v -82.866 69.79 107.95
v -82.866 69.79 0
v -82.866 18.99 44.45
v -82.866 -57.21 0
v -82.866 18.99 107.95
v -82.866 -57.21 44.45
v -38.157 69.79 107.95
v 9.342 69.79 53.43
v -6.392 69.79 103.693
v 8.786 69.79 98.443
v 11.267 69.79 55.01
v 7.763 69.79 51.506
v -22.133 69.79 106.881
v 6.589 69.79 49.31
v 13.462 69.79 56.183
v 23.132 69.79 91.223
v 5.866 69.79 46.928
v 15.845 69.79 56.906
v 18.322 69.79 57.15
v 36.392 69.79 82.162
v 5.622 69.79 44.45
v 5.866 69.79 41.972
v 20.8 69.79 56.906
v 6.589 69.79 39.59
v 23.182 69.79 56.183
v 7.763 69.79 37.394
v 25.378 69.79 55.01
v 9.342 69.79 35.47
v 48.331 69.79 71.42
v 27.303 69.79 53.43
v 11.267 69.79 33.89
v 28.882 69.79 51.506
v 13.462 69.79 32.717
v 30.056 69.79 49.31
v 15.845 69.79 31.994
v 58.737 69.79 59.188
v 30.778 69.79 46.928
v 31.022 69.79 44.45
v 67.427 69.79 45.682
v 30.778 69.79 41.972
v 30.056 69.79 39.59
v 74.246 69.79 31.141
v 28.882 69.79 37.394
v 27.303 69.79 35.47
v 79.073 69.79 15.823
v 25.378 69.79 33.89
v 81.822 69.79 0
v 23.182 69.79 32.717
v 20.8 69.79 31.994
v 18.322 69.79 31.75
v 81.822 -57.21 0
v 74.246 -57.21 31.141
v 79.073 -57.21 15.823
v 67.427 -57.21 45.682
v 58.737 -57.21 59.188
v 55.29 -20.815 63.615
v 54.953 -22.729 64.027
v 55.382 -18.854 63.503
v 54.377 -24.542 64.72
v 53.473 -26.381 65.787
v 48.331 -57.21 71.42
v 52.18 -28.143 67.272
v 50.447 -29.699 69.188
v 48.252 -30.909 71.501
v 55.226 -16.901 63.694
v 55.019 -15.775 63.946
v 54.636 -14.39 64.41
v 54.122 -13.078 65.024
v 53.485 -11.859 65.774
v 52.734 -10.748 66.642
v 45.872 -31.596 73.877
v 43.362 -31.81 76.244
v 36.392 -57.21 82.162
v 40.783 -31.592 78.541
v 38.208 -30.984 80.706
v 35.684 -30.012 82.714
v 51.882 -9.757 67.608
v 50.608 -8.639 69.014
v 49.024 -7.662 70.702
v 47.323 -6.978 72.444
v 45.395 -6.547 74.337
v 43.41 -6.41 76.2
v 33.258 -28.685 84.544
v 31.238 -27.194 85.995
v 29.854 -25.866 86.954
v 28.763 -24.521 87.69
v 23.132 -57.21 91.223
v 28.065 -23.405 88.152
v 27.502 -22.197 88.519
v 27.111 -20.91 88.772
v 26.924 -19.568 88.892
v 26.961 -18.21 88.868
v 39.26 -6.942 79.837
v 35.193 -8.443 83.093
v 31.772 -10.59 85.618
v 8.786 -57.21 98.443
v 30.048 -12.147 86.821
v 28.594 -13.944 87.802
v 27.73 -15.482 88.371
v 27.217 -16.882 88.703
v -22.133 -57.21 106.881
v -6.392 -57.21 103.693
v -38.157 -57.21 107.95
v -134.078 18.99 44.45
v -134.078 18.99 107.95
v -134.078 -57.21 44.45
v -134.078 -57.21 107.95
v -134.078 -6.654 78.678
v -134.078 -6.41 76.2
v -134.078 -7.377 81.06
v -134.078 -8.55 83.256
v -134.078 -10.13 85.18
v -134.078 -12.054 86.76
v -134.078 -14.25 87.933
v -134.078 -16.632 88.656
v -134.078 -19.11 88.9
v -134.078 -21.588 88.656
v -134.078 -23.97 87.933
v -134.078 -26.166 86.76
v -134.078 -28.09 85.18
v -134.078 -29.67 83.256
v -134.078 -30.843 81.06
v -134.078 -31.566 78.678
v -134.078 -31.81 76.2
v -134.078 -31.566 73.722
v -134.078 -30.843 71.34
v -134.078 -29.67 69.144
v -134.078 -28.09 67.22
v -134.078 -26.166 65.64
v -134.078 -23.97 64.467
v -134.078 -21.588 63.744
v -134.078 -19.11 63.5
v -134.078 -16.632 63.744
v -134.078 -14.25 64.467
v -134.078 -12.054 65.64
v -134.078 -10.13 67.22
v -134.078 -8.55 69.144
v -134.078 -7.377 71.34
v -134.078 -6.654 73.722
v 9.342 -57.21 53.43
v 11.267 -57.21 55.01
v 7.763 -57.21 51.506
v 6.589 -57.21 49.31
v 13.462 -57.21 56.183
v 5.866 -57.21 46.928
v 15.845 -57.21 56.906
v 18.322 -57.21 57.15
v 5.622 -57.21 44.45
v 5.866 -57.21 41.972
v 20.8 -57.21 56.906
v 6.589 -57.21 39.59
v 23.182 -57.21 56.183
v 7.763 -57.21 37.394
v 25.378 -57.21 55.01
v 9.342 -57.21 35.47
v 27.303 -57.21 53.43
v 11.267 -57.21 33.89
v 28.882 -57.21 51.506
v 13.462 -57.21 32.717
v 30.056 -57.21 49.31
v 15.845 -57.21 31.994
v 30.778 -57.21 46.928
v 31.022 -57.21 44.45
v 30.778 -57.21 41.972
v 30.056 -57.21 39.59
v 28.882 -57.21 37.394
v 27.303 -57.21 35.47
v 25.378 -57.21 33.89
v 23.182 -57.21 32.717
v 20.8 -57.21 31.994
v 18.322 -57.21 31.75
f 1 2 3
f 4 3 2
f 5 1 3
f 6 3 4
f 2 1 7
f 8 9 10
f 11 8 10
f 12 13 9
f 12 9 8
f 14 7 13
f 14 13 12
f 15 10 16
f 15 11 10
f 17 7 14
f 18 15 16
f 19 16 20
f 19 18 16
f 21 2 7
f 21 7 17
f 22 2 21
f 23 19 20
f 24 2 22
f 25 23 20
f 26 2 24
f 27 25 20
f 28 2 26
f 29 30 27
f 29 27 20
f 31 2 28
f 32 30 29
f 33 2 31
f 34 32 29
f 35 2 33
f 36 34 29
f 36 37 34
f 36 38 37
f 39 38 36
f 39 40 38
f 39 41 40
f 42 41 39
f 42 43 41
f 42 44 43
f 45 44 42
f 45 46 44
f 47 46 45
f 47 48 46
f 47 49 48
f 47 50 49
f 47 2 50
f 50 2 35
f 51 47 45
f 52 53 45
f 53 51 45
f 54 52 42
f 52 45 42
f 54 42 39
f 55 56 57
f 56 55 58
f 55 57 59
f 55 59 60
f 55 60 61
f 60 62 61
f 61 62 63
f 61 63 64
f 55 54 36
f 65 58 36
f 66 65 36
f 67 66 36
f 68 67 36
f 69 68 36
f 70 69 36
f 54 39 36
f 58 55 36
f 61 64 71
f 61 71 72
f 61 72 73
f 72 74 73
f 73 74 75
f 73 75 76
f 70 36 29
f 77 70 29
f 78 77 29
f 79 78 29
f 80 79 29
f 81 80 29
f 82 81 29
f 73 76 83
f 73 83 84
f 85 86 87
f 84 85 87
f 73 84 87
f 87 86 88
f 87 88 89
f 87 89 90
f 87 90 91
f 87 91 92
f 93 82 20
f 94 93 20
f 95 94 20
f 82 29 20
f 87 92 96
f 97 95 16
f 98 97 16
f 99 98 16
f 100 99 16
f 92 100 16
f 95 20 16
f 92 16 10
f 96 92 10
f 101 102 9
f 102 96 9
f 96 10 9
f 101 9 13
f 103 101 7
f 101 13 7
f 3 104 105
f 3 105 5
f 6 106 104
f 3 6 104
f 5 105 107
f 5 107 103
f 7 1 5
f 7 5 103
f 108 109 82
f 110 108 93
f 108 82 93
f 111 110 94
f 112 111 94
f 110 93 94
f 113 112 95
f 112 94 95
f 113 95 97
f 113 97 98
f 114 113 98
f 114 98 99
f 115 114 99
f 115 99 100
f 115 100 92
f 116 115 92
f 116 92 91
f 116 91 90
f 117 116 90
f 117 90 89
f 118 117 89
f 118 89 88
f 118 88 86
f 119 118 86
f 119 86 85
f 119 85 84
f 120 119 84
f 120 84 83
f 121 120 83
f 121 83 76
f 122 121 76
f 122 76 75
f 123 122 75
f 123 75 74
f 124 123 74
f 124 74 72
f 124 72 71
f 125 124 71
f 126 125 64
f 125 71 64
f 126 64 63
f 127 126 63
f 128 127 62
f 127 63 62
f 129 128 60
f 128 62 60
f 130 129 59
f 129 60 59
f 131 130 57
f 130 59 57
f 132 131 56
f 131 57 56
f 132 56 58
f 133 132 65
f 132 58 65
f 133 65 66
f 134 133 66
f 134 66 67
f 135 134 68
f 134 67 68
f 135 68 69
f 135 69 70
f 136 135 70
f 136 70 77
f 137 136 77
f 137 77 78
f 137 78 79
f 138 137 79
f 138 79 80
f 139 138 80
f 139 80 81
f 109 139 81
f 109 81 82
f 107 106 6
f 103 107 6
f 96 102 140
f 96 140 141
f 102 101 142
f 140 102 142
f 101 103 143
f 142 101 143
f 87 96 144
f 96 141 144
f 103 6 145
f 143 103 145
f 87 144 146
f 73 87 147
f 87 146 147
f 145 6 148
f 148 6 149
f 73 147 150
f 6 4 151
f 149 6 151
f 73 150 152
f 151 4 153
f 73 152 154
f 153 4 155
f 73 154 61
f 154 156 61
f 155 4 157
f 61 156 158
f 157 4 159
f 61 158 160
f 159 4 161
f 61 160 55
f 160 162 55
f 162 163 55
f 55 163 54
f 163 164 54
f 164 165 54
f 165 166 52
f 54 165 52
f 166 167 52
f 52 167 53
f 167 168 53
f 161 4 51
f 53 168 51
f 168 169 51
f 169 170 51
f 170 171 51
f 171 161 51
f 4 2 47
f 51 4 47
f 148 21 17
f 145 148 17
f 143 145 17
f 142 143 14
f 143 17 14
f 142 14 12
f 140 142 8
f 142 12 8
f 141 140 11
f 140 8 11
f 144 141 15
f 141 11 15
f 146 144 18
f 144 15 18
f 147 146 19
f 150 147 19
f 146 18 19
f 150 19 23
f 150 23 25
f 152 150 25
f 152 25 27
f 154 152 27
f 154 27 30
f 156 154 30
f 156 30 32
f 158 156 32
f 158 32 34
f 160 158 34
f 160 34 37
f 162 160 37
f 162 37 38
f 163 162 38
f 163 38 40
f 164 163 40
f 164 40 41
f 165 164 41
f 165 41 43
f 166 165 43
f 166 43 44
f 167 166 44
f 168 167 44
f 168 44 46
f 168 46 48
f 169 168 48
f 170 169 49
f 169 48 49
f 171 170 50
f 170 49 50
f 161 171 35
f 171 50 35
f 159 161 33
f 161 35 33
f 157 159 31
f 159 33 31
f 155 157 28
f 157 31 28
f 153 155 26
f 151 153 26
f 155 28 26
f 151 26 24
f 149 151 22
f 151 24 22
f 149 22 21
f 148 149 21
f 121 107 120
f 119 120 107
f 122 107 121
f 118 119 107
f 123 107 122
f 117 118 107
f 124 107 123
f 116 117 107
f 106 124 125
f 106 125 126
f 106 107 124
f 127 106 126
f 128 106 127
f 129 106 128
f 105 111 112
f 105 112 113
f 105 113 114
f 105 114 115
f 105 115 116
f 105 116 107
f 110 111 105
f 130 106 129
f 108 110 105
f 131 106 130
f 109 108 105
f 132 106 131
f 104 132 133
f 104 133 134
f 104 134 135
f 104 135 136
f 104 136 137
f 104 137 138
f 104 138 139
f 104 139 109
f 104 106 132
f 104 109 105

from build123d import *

# Parameters (mm, degrees)
F0_W        = 215.9
F0_H        = 127
F1_DEPTH    = 107.95
F4_W        = 50.8
F4_H        = 50.8
F5_DEPTH    = 107.95
F6_DEPTH    = 51.21156
F7_T1_DEPTH = 726.8985851792
F9_D        = 25.4
F10_D       = 25.4


# Not quite as in the source:
# - a fillet or chamfer that OpenCascade refuses, or shapes differently, is made with other operations: its cross-section is extruded or revolved along the edge and cut away or added


with BuildPart() as f1:
    # F0 (on Top) → F1 (new body)
    with BuildSketch(Plane.XY):
        with Locations((-26.1275832451, 6.2899636105)):
            Rectangle(F0_W, F0_H)
    extrude(amount=F1_DEPTH)

    # F4 (on face) → F5 (cut)
    with BuildSketch(Plane.XY.offset(107.95)):
        with Locations((-108.6775832451, 44.3899636105)):
            Rectangle(F4_W, F4_H)
    extrude(amount=-F5_DEPTH, mode=Mode.SUBTRACT)

    # F2 (on face) → F6 (cut)
    with BuildSketch(Plane(origin=(-134.0775832451, 0, 0), x_dir=(0, -1, 0), z_dir=(-1, 0, 0))):
        Polygon((-18.9899636105, 44.45), (-18.9899636105, 107.95), (-69.7899636105, 107.95), (-69.7899636105, 0), (57.2100363895, 0), (57.2100363895, 44.45), align=None)
    extrude(amount=-F6_DEPTH, mode=Mode.SUBTRACT)

    # F7: fillet of radius 120.65 on 1 edges, made by hand

    # F7_s2 → F7_t1 (cut)
    with BuildSketch(Plane.XZ.offset(-369.7392562001)):
        with BuildLine():
            ThreePointArc((81.8224167549, 0), (42.5401826414, 76.9902377631), (-38.1573002809, 107.95))
            Line((-38.1573002809, 107.95), (81.8224167549, 107.95))
            Line((81.8224167549, 107.95), (81.8224167549, 0))
        make_face()
    extrude(amount=F7_T1_DEPTH, mode=Mode.SUBTRACT)

    # F9 (through all)
    with Locations(Plane.XZ.offset(57.2100363895)):
        with Locations((18.3224167549, 44.45)):
            Hole(F9_D / 2)

    # F10 (through all)
    with Locations(Plane(origin=(-134.0775832451, 0, 0), x_dir=(0, -1, 0), z_dir=(-1, 0, 0))):
        with Locations((19.1100363895, 76.2)):
            Hole(F10_D / 2)


solid = f1.part
